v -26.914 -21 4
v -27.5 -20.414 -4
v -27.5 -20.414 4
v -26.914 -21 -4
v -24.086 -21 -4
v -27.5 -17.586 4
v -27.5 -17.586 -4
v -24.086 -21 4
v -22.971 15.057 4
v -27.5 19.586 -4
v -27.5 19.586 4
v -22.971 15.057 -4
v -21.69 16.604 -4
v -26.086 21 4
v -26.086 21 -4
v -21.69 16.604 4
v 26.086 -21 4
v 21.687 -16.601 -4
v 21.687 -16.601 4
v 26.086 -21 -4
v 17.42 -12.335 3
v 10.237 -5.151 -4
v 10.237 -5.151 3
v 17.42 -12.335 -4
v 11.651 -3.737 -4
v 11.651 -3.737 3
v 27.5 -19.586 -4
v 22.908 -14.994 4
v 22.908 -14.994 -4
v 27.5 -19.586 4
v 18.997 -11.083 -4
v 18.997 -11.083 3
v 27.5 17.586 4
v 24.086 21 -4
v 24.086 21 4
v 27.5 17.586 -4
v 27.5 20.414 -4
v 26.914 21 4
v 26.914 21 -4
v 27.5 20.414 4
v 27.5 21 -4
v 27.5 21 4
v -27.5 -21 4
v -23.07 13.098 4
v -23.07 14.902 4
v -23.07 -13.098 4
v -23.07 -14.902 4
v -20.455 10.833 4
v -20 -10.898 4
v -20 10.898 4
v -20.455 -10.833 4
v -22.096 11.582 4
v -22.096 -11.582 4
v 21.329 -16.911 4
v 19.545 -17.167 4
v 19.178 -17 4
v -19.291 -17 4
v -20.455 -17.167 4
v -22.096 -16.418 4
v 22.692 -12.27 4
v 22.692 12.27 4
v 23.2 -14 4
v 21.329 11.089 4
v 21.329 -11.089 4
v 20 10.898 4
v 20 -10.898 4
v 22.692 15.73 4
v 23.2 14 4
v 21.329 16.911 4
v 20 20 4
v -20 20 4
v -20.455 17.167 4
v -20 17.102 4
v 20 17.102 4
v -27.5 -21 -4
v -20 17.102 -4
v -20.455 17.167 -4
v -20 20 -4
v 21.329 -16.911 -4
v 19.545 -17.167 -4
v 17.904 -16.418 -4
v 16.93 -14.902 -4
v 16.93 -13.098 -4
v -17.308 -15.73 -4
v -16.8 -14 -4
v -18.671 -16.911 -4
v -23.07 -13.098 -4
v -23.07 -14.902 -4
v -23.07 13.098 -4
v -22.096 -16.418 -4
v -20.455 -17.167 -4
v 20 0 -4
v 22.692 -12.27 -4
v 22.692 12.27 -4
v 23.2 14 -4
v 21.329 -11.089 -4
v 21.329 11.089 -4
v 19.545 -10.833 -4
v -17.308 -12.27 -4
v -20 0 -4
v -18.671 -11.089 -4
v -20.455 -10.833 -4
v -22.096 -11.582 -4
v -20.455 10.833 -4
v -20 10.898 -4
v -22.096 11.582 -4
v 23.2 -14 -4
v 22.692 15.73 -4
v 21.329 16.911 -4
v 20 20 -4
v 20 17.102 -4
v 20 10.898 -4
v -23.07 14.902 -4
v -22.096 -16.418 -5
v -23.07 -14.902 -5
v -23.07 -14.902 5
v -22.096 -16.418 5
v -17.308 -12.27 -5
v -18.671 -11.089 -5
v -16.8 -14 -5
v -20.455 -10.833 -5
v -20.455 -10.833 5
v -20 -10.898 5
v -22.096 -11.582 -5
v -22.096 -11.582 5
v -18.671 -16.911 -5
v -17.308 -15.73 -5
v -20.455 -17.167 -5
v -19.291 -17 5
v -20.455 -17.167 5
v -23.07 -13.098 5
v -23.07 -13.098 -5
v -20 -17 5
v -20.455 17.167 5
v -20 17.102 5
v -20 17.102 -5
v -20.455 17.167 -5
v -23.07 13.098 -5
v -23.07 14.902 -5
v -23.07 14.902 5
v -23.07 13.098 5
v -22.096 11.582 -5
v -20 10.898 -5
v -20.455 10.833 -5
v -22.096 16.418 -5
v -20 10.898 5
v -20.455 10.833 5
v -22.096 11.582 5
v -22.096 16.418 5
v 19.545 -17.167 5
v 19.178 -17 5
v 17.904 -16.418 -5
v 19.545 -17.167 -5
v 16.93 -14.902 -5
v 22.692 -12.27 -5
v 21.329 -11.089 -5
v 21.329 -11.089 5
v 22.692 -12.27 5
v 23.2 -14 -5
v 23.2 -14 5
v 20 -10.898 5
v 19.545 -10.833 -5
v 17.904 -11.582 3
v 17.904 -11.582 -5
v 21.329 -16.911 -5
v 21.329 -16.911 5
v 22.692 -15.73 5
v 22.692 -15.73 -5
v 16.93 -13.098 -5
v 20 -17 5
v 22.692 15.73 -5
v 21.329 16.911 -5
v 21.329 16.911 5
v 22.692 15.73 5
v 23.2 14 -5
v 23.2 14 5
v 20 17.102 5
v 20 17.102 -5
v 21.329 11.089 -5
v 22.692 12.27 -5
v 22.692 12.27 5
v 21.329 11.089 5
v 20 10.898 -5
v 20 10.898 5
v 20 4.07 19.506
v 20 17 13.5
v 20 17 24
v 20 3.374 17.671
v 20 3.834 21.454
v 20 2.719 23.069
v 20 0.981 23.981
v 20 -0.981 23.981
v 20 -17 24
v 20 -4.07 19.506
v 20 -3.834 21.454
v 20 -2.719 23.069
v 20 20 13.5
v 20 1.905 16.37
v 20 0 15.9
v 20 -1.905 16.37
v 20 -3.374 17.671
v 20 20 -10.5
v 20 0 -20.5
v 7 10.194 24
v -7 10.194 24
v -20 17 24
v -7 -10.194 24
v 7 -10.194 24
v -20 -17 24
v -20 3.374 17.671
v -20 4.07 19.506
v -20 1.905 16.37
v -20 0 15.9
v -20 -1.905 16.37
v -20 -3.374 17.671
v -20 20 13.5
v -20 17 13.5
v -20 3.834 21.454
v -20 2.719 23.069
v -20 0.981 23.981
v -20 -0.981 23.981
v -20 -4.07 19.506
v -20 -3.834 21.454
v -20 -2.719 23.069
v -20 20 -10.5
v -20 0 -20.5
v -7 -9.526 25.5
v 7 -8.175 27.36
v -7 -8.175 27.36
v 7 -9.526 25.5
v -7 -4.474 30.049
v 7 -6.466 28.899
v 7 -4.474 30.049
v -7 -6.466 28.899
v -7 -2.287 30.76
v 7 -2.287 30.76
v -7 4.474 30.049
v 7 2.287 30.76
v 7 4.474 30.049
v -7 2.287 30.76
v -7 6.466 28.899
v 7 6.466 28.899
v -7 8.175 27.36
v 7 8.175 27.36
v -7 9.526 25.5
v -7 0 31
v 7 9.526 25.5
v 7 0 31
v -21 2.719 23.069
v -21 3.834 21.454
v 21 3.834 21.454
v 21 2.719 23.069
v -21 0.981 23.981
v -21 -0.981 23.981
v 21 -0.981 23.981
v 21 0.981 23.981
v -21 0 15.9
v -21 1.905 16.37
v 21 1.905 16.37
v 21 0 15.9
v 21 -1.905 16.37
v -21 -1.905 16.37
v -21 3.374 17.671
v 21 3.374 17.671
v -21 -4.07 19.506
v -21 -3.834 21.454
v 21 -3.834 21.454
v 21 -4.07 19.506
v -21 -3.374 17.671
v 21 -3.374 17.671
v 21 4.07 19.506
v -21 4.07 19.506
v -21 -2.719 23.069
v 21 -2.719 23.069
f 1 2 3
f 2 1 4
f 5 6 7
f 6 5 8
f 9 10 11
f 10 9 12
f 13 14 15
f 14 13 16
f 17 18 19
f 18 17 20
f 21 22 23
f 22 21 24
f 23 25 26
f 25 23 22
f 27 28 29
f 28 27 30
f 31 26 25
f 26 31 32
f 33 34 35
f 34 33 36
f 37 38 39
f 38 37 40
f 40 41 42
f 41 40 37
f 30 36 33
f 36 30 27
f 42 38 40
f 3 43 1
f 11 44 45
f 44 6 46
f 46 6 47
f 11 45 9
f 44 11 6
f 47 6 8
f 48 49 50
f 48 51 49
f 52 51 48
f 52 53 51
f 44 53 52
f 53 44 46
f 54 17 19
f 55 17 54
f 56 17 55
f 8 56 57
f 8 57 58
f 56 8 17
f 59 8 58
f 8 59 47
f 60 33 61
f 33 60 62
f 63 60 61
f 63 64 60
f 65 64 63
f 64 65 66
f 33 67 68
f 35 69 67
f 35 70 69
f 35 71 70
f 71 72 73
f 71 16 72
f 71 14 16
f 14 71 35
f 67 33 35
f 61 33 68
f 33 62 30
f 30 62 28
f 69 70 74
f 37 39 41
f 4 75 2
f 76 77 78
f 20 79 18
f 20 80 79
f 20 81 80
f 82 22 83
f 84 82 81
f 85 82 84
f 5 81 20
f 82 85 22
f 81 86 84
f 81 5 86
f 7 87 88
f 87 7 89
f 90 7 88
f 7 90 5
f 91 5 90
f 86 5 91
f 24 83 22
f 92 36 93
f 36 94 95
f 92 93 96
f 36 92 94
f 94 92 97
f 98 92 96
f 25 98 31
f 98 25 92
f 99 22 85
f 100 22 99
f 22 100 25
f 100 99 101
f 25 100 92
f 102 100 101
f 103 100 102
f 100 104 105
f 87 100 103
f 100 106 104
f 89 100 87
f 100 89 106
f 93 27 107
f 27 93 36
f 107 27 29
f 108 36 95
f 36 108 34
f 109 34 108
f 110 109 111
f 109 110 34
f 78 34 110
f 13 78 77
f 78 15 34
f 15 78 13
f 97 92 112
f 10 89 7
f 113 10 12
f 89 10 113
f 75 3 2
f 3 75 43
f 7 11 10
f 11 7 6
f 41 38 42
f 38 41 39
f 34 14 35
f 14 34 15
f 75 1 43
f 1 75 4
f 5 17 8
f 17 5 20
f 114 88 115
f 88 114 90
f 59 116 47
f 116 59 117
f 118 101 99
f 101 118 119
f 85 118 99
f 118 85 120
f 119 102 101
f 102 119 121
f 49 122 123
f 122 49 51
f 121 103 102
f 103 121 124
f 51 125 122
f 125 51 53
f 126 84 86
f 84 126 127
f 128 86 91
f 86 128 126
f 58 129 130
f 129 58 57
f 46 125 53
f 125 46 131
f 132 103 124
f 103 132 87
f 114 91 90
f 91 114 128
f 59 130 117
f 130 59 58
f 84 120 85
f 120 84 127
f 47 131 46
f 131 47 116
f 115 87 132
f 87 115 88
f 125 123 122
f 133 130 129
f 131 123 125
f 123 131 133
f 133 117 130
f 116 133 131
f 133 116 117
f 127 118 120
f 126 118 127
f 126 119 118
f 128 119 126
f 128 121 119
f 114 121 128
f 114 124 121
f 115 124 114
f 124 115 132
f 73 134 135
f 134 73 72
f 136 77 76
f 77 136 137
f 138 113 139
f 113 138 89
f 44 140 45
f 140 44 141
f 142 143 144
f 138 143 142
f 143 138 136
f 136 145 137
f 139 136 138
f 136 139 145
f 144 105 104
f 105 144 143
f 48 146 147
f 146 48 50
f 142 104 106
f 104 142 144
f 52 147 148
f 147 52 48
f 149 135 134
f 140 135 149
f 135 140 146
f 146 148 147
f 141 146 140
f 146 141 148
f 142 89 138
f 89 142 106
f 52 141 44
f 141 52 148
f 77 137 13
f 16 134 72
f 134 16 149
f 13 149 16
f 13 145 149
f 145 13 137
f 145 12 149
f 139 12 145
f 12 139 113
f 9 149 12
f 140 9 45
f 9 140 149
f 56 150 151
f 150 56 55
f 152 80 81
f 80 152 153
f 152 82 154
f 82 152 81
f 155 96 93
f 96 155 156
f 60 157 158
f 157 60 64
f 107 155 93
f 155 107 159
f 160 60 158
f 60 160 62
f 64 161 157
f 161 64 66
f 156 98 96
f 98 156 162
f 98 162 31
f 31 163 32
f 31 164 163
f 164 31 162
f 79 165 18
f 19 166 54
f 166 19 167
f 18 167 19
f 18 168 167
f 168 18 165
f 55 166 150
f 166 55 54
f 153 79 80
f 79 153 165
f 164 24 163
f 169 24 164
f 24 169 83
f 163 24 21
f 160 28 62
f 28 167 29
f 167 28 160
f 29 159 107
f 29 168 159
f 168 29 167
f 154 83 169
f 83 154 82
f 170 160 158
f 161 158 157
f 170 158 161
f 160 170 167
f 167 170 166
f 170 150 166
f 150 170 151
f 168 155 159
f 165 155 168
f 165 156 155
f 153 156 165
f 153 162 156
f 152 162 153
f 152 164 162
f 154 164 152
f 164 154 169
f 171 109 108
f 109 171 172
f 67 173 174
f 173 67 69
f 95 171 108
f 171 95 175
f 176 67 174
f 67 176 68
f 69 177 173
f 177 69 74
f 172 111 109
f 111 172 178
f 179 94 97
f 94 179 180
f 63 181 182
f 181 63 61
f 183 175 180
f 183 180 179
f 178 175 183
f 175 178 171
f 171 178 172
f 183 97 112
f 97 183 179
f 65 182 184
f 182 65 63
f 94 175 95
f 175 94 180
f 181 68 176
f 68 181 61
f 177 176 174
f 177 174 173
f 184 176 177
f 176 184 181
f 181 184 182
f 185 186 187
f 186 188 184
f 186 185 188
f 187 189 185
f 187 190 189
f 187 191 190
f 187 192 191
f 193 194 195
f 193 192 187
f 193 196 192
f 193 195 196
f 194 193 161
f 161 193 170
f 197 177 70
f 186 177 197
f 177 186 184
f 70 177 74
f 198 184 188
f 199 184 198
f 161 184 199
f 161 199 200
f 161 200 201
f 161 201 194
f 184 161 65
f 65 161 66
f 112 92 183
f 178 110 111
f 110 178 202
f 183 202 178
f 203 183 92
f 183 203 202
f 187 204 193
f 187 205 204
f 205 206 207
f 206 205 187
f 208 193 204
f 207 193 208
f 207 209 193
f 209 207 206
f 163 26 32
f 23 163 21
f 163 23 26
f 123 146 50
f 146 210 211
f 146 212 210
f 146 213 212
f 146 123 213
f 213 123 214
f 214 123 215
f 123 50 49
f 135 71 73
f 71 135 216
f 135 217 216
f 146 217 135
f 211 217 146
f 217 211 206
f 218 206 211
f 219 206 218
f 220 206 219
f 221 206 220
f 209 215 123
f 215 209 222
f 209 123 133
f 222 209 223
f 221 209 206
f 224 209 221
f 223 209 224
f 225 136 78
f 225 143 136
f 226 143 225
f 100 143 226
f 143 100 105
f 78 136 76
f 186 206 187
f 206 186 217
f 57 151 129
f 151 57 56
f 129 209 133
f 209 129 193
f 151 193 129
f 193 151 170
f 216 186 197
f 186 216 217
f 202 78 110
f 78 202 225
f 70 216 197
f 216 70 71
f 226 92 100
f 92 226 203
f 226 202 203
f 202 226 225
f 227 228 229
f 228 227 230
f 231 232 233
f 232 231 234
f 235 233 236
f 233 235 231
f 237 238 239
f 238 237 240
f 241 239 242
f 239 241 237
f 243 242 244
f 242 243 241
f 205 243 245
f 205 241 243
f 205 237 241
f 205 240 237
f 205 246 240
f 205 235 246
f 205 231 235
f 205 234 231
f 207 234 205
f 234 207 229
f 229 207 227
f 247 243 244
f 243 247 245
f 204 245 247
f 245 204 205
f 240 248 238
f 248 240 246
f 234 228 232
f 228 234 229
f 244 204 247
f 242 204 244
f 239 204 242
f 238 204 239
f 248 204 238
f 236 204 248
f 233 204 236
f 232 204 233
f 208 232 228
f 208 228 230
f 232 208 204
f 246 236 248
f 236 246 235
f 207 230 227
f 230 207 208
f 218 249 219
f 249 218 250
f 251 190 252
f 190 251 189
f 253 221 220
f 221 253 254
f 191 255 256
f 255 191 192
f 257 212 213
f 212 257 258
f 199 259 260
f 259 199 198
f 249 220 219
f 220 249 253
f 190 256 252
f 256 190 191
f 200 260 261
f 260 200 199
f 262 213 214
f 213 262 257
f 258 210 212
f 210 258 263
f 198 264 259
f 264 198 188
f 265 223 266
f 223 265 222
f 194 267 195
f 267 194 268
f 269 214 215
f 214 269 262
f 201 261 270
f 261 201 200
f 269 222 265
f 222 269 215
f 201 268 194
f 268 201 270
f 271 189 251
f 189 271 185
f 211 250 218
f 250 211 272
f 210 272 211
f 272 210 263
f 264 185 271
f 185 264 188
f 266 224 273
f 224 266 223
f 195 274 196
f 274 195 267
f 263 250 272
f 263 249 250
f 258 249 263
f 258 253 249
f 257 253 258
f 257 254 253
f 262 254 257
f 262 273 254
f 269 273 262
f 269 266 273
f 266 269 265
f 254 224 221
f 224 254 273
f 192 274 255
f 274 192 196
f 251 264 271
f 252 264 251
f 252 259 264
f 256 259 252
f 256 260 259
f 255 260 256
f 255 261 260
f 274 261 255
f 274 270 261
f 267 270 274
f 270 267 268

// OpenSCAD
// Parameters
shaft_diameter = 8; //[4:16:0.1]
shaft_bore_clearance = 0.2; //[0.05:0.6:0.05]
base_length = 55; //[30:110:0.5]
base_width = 42; //[21:84:0.5]
base_thickness = 8; //[4:16:0.5]
overall_height = 28; //[18:56:0.5]
mounting_hole_diameter = 6; //[3:10:0.1]
mounting_hole_clearance = 0.4; //[0.1:1.2:0.1]
mounting_hole_spacing_length = 40; //[25:80:0.5]
mounting_hole_spacing_width = 28; //[16:60:0.5]
bearing_outer_diameter = 22; //[14:44:0.5]
bearing_width = 12; //[6:24:0.5]
housing_length = 40; //[25:80:0.5]
housing_width = 34; //[20:70:0.5]
housing_top_extra = 6; //[2:16:0.5]
trapezoid_top_shrink = 10; //[4:20:0.5]
edge_chamfer = 1; //[0.5:3:0.25]
overlap = 1; //[0.5:2:0.1]

// Right Trapezoid
module right_trapezoid() {
  color("DimGray") {
    translate([0, 0, base_thickness/2 + (overall_height - base_thickness)/2 - overlap/2])
    rotate([0, 90, 0])
    linear_extrude(height=housing_length, center=true) {
      polygon(points=[
        [0, 0],
        [housing_width, 0],
        [housing_width - trapezoid_top_shrink, overall_height - base_thickness],
        [0, overall_height - base_thickness]
      ]);
    }
  }
}

// Sbr Bearing Block Assembly
module sbr_bearing_block_assembly() {
  color("Silver") {
    union() {
      translate([0, 0, base_thickness/2 + (bearing_outer_diameter/2 + housing_top_extra) - overlap])
      rotate([0, 90, 0])
      cylinder(r=bearing_outer_diameter/2, h=bearing_width + 2*overlap, center=true);
    }
  }
}

// Kp Pillow Block Assembly
module kp_pillow_block_assembly() {
  color("Black") {
    union() {
      translate([0, 0, base_thickness/2 + (overall_height - base_thickness + overlap)/2 - overlap])
      cube([housing_length, housing_width, overall_height - base_thickness + overlap], center=true);
    }
  }
}

// Scs Bearing Block
module scs_bearing_block() {
  color("Silver") {
    union() {
      translate([0, 0, base_thickness/2 + (bearing_outer_diameter/2 + housing_top_extra) - overlap])
      rotate([0, 90, 0])
      cylinder(r=(shaft_diameter + shaft_bore_clearance)/2, h=housing_length + 2*overlap, center=true);
    }
  }
}

// Kp Pillow Block Hole Positions
module kp_pillow_block_hole_positions() {
  color("Black") {
    union() {
      for (x = [-1, 1])
        for (y = [-1, 1])
          translate([x * mounting_hole_spacing_length/2, y * mounting_hole_spacing_width/2, 0])
          cylinder(r=(mounting_hole_diameter + mounting_hole_clearance)/2, h=base_thickness + 2*overlap, center=true);
    }
  }
}

// Base Plate with Chamfers
module base_plate_with_chamfers() {
  color("Silver") {
    difference() {
      translate([0, 0, 0])
      cube([base_length, base_width, base_thickness], center=true);
      for (x = [-1, 1])
        for (y = [-1, 1])
          translate([x * (base_length/2 - edge_chamfer), y * (base_width/2 - edge_chamfer), 0])
          rotate([0, 0, 45])
          cube([edge_chamfer*2, base_width + 2*overlap, base_thickness + 2*overlap], center=true);
    }
  }
}

// Assembly
module assembly() {
  base_plate_with_chamfers();
  kp_pillow_block_hole_positions();
  kp_pillow_block_assembly();
  right_trapezoid();
  sbr_bearing_block_assembly();
  scs_bearing_block();
}

assembly();
